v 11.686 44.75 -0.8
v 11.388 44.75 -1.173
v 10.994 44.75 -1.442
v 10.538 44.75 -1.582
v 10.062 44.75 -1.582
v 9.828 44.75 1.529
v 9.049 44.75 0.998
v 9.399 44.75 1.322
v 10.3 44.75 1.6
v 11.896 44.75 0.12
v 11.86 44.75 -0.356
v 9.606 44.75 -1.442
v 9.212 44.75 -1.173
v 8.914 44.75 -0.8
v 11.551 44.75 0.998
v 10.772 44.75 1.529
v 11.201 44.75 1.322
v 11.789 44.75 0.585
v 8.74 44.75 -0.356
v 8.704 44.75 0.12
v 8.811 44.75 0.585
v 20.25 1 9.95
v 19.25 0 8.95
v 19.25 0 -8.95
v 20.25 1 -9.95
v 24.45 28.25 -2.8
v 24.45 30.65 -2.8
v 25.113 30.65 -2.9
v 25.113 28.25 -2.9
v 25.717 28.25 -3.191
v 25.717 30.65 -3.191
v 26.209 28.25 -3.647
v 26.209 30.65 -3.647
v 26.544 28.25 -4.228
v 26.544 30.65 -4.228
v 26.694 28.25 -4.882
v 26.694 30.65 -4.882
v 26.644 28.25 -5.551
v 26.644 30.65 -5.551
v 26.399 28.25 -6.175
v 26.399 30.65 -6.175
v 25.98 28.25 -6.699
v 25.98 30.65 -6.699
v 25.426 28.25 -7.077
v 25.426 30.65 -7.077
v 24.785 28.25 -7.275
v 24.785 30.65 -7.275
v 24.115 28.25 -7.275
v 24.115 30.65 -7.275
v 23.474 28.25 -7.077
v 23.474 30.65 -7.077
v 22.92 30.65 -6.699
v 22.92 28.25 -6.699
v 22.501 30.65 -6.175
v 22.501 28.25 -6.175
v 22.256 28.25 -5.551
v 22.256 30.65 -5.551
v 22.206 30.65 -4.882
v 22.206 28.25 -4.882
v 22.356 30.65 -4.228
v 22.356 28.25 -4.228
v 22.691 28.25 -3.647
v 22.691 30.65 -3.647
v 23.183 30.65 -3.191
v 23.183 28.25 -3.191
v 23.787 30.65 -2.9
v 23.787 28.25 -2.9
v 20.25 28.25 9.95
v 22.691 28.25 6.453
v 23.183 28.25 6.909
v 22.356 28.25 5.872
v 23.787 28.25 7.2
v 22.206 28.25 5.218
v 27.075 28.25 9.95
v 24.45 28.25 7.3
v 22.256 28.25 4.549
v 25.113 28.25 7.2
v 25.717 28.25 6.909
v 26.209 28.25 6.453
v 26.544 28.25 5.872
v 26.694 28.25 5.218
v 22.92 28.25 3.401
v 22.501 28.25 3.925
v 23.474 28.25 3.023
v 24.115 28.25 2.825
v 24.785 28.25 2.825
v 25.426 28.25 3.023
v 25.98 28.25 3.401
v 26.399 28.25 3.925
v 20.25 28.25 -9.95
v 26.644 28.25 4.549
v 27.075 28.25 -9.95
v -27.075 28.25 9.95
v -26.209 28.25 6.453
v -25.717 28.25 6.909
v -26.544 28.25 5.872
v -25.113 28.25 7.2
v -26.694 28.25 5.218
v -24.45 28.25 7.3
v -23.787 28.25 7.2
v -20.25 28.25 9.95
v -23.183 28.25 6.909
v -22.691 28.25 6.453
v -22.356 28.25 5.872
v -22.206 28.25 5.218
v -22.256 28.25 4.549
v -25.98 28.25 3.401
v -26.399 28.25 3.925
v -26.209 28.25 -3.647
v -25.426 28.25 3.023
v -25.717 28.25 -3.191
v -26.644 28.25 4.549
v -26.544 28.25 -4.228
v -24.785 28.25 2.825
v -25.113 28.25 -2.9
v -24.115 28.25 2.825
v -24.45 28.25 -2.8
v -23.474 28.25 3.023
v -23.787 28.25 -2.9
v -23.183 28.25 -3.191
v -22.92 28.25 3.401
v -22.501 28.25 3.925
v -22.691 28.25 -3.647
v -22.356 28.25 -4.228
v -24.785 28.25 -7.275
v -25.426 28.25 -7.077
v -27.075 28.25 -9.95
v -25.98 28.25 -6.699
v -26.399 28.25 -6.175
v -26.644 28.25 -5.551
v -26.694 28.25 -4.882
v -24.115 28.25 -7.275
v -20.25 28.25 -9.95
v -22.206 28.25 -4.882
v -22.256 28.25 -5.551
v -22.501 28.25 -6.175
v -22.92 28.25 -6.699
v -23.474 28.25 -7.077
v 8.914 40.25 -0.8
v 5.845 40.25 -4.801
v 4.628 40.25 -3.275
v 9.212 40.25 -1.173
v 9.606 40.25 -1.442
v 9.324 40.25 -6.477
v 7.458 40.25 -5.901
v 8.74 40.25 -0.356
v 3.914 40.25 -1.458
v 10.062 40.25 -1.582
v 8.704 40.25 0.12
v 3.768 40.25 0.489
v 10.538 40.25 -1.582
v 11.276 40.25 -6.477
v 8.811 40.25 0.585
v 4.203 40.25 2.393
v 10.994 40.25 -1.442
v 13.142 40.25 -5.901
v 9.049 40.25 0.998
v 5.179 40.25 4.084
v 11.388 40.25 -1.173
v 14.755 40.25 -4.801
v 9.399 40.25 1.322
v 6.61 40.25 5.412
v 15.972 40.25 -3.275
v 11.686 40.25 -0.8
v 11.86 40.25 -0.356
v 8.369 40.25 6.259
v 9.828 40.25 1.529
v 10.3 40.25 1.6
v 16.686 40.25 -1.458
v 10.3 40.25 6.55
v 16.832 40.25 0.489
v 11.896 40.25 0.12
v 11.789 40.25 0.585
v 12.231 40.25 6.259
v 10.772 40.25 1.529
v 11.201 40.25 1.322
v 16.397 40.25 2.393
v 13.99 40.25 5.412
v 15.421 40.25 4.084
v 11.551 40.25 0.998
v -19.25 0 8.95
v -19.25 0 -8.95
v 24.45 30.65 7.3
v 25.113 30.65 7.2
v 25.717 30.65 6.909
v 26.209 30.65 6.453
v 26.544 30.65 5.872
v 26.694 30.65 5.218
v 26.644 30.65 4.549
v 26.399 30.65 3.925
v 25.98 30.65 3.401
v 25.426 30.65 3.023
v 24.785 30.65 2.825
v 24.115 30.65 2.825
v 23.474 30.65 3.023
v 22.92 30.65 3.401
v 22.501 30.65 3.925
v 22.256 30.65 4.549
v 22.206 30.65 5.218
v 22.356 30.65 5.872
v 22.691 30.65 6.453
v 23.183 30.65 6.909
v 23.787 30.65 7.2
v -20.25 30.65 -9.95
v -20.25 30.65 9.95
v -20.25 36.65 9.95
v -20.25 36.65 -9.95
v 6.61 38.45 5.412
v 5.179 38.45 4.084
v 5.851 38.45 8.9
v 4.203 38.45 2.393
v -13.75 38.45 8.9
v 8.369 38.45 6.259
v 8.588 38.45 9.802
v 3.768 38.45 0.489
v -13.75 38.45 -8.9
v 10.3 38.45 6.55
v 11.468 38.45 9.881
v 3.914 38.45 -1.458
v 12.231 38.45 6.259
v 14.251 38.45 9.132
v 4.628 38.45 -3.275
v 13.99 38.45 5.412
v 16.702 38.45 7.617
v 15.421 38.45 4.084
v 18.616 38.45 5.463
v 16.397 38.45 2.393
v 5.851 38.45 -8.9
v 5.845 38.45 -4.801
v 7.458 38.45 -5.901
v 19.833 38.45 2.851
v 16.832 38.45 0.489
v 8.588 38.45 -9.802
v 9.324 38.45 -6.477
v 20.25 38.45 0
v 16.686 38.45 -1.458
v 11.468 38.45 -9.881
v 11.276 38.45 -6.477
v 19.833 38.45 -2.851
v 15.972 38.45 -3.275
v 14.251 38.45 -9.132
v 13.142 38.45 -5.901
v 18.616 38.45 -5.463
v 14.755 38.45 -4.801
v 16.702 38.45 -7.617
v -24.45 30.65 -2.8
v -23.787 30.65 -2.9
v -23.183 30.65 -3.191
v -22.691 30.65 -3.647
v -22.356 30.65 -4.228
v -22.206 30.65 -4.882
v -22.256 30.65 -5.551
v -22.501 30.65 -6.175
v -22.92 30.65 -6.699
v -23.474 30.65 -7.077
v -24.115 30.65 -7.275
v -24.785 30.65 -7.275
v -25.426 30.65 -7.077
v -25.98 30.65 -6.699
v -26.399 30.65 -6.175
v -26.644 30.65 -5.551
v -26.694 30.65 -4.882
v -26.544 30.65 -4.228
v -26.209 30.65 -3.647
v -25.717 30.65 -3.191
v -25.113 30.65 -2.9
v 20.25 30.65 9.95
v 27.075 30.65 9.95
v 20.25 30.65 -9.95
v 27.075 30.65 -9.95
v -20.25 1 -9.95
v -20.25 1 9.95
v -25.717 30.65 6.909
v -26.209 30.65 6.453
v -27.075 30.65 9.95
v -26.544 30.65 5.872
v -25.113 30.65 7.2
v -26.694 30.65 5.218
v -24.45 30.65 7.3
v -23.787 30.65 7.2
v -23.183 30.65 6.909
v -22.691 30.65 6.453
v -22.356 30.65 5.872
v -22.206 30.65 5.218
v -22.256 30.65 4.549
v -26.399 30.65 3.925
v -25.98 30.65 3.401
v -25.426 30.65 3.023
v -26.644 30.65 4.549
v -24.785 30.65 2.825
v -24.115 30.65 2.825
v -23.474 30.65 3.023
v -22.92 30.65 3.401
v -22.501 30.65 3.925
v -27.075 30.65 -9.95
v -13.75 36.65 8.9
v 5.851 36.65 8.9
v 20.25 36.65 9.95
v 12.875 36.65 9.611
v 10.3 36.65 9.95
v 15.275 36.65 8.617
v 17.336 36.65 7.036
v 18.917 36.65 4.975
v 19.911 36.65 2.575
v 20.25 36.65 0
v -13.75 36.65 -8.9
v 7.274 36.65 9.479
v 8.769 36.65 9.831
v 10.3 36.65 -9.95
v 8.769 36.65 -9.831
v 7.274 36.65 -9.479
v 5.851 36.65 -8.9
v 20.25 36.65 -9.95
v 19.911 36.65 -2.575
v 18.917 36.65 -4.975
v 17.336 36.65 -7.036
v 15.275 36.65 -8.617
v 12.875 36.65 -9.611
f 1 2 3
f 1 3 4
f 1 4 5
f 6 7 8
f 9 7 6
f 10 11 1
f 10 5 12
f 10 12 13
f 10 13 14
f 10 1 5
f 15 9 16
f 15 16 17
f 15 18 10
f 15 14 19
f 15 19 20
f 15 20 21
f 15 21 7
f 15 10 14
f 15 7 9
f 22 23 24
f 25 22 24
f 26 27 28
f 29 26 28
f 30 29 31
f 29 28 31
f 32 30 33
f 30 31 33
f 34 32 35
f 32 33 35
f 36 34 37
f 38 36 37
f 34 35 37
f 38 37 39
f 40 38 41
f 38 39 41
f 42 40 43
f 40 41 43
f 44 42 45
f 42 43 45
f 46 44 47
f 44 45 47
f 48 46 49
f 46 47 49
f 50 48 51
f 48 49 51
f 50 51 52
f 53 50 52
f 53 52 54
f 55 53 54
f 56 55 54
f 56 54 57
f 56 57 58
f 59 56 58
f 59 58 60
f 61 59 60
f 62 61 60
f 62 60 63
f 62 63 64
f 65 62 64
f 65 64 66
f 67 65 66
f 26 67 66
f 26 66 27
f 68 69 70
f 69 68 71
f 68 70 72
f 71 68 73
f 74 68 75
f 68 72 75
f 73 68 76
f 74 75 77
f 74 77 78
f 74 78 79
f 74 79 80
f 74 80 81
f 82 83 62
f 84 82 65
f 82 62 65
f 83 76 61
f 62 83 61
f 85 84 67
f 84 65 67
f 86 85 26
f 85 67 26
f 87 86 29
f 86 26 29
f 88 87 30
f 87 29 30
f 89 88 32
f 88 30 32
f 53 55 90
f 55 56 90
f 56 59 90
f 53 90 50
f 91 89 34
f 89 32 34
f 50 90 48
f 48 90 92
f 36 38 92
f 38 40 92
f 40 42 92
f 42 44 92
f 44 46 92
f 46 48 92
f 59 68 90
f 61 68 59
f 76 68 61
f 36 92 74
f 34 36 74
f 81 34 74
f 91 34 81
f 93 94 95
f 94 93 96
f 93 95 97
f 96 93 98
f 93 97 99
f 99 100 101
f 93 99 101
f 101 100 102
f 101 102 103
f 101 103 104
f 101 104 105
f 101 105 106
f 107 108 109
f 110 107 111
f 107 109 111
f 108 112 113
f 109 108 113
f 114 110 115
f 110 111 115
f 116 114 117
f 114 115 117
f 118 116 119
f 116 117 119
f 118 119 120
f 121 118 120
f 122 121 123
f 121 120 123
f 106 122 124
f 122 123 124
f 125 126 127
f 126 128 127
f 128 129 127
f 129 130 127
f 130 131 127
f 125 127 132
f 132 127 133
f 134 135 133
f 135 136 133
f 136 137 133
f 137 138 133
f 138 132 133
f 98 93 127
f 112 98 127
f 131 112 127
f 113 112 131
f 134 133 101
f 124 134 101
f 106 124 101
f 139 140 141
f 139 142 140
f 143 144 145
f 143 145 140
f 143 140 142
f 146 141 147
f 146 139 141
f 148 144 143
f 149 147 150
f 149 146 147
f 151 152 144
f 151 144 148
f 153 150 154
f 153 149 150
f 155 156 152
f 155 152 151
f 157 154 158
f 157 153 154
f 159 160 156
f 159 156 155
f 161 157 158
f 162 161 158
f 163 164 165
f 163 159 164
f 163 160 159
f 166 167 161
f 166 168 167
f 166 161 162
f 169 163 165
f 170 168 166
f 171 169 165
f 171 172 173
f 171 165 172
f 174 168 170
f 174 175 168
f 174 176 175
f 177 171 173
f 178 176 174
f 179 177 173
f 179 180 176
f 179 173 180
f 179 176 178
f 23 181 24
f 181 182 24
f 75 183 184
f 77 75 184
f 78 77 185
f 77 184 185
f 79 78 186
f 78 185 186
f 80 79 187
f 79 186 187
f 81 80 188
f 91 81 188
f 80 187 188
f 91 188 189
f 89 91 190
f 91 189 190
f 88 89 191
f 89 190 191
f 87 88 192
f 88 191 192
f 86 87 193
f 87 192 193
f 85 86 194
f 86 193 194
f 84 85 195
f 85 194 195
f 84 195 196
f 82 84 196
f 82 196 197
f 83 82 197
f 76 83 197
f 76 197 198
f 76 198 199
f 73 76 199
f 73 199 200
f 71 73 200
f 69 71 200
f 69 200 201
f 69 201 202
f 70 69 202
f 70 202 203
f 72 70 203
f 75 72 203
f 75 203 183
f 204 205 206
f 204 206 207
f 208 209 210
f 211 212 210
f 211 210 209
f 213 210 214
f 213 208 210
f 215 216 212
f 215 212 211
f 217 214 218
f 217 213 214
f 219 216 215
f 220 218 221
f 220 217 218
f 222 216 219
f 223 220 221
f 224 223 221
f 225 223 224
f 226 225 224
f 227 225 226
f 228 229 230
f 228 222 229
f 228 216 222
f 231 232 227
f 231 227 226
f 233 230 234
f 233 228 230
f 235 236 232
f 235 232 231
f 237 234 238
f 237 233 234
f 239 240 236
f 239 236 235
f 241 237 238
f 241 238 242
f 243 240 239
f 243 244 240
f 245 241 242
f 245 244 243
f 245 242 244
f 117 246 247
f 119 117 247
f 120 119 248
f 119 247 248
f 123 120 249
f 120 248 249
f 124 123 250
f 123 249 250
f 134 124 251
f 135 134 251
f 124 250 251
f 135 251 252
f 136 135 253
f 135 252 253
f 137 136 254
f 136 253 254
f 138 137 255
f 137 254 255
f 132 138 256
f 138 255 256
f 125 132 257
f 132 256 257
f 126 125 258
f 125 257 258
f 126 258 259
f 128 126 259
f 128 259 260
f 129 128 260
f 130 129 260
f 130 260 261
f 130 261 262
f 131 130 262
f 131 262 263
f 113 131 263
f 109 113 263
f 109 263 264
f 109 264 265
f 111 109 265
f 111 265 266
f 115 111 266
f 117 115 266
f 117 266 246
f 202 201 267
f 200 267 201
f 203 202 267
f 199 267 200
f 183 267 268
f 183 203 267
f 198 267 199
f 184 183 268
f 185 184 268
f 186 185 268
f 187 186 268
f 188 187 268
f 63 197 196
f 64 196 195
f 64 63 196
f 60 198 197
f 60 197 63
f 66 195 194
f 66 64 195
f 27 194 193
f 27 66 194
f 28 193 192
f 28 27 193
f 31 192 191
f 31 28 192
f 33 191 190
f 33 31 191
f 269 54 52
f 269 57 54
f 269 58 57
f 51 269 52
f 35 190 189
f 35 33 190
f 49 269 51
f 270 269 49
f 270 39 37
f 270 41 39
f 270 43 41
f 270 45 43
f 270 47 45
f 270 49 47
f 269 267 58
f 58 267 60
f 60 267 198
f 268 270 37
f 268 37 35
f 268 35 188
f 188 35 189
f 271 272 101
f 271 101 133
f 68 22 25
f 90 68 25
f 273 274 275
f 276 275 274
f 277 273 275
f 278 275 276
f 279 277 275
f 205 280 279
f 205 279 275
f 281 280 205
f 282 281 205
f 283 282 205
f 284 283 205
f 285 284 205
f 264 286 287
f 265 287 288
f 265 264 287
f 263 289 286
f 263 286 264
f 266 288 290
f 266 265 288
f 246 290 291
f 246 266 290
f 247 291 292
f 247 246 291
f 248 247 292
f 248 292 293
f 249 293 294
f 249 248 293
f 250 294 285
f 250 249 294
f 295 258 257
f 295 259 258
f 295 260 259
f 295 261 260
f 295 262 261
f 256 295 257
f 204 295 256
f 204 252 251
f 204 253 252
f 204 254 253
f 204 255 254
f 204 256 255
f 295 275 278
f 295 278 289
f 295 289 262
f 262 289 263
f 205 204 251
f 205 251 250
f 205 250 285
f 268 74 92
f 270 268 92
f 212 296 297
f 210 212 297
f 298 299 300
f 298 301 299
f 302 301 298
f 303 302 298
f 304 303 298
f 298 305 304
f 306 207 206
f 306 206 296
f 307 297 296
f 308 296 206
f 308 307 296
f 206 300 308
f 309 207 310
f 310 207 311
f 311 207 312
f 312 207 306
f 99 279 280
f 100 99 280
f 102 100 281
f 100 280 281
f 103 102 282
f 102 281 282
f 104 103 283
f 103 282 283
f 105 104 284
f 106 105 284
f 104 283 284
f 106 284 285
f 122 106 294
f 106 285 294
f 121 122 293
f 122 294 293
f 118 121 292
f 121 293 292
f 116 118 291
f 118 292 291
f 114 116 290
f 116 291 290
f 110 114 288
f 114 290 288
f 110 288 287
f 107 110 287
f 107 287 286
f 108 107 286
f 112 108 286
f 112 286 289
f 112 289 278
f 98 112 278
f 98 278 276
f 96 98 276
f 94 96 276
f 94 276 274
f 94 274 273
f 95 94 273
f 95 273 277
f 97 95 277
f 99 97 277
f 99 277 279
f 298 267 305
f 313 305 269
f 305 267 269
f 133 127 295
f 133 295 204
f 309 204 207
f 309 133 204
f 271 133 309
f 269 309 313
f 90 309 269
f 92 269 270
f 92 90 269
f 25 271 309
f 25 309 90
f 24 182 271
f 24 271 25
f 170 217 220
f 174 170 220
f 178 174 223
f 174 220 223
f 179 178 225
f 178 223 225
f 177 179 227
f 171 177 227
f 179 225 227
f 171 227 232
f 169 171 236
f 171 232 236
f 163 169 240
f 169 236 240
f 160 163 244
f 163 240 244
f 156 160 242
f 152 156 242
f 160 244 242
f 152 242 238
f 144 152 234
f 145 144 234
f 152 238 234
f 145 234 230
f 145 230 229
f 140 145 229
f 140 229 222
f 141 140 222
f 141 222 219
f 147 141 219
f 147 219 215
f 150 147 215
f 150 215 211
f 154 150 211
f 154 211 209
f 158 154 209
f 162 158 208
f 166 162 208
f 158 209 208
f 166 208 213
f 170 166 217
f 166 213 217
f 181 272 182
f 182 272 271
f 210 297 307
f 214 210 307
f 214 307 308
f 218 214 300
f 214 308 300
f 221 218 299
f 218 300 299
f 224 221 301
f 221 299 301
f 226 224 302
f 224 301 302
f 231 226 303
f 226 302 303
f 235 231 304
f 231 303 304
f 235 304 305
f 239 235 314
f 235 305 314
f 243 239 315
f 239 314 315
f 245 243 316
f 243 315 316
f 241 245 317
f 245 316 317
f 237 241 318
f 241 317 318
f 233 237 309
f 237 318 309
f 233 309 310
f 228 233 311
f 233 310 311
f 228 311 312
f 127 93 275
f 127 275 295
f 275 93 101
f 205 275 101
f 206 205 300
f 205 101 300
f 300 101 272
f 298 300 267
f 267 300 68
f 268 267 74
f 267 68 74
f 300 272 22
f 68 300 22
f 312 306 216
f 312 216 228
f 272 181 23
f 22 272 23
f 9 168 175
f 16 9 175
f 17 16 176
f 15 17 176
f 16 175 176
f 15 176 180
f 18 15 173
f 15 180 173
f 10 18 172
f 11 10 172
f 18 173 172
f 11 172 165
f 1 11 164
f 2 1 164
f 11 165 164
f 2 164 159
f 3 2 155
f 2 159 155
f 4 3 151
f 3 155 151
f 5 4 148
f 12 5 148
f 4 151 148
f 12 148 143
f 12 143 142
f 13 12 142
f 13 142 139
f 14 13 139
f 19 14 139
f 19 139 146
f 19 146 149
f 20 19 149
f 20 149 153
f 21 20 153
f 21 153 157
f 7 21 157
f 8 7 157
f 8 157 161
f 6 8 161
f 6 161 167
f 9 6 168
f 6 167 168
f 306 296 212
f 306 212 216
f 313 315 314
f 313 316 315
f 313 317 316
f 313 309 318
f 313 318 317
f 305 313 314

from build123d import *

# Parameters (mm, degrees)
SKETCH_1_W          = 40.5
SKETCH_1_H          = 19.9
EXTRUDE_1_DEPTH     = 28.25
SKETCH_2_W          = 54.15
SKETCH_2_H          = 19.9
EXTRUDE_2_DEPTH     = 2.4
SKETCH_3_W          = 40.5
SKETCH_3_H          = 19.9
EXTRUDE_3_DEPTH     = 6
SKETCH_4_R          = 9.95
SKETCH_4_W          = 19.601123737
SKETCH_4_H          = 17.8
EXTRUDE_4_DEPTH     = 1.8
SKETCH_5_R          = 6.55
EXTRUDE_5_DEPTH     = 1.8
SKETCH_6_R          = 1.6
EXTRUDE_6_DEPTH     = 4.5
SKETCH_7_R          = 2.25
CUT_EXTRUDE_1_DEPTH = 43.088960845
CHAMFER_1_SIZE      = 1


with BuildPart() as part:
    # 草图1 → 凸台-拉伸1 (new body)
    with BuildSketch(Plane(origin=(0, 0, 0), x_dir=(1, 0, 0), z_dir=(0, 1, 0))):
        Rectangle(SKETCH_1_W, SKETCH_1_H)
    extrude(amount=EXTRUDE_1_DEPTH)

    # 草图2 → 凸台-拉伸2 (add)
    with BuildSketch(Plane(origin=(0, 28.25, 0), x_dir=(1, 0, 0), z_dir=(0, 1, 0))):
        Rectangle(SKETCH_2_W, SKETCH_2_H)
    extrude(amount=EXTRUDE_2_DEPTH)

    # 草图3 → 凸台-拉伸3 (add)
    with BuildSketch(Plane(origin=(0, 30.65, 0), x_dir=(1, 0, 0), z_dir=(0, 1, 0))):
        Rectangle(SKETCH_3_W, SKETCH_3_H)
    extrude(amount=EXTRUDE_3_DEPTH)

    # 草图4 → 凸台-拉伸4 (add)
    with BuildSketch(Plane(origin=(0, 36.65, 0), x_dir=(1, 0, 0), z_dir=(0, 1, 0))):
        with Locations((10.3, 0)):
            Circle(SKETCH_4_R)
        with Locations((-3.949438132, 0)):
            Rectangle(SKETCH_4_W, SKETCH_4_H)
    extrude(amount=EXTRUDE_4_DEPTH)

    # 草图5 → 凸台-拉伸5 (add)
    with BuildSketch(Plane(origin=(0, 38.45, 0), x_dir=(1, 0, 0), z_dir=(0, 1, 0))):
        with Locations(Location((10.3, 0, 0), (0, 0, 270))):
            Circle(SKETCH_5_R)
    extrude(amount=EXTRUDE_5_DEPTH)

    # 草图6 → 凸台-拉伸6 (add)
    with BuildSketch(Plane(origin=(0, 40.25, 0), x_dir=(1, 0, 0), z_dir=(0, 1, 0))):
        with Locations(Location((10.3, 0, 0), (0, 0, 270))):
            Circle(SKETCH_6_R)
    extrude(amount=EXTRUDE_6_DEPTH)

    # 草图7 → 切除-拉伸1 (cut, through all)
    with BuildSketch(Plane(origin=(0, 30.65, 0), x_dir=(1, 0, 0), z_dir=(0, 1, 0))):
        with Locations(Location((24.45, -5.05, 0), (0, 0, 270))):
            Circle(SKETCH_7_R)
        with Locations(Location((24.45, 5.05, 0), (0, 0, 270))):
            Circle(SKETCH_7_R)
        with Locations(Location((-24.45, 5.05, 0), (0, 0, 270))):
            Circle(SKETCH_7_R)
        with Locations(Location((-24.45, -5.05, 0), (0, 0, 270))):
            Circle(SKETCH_7_R)
    extrude(amount=-CUT_EXTRUDE_1_DEPTH, mode=Mode.SUBTRACT)

    # 倒角1
    chamfer_1_edges = [part.edges().sort_by_distance(p)[0] for p in [
        (0, 0, 9.95),
        (-20.25, 0, 0),
        (0, 0, -9.95),
        (20.25, 0, 0),
    ]]
    chamfer(chamfer_1_edges, length=CHAMFER_1_SIZE)


solid = part.part
